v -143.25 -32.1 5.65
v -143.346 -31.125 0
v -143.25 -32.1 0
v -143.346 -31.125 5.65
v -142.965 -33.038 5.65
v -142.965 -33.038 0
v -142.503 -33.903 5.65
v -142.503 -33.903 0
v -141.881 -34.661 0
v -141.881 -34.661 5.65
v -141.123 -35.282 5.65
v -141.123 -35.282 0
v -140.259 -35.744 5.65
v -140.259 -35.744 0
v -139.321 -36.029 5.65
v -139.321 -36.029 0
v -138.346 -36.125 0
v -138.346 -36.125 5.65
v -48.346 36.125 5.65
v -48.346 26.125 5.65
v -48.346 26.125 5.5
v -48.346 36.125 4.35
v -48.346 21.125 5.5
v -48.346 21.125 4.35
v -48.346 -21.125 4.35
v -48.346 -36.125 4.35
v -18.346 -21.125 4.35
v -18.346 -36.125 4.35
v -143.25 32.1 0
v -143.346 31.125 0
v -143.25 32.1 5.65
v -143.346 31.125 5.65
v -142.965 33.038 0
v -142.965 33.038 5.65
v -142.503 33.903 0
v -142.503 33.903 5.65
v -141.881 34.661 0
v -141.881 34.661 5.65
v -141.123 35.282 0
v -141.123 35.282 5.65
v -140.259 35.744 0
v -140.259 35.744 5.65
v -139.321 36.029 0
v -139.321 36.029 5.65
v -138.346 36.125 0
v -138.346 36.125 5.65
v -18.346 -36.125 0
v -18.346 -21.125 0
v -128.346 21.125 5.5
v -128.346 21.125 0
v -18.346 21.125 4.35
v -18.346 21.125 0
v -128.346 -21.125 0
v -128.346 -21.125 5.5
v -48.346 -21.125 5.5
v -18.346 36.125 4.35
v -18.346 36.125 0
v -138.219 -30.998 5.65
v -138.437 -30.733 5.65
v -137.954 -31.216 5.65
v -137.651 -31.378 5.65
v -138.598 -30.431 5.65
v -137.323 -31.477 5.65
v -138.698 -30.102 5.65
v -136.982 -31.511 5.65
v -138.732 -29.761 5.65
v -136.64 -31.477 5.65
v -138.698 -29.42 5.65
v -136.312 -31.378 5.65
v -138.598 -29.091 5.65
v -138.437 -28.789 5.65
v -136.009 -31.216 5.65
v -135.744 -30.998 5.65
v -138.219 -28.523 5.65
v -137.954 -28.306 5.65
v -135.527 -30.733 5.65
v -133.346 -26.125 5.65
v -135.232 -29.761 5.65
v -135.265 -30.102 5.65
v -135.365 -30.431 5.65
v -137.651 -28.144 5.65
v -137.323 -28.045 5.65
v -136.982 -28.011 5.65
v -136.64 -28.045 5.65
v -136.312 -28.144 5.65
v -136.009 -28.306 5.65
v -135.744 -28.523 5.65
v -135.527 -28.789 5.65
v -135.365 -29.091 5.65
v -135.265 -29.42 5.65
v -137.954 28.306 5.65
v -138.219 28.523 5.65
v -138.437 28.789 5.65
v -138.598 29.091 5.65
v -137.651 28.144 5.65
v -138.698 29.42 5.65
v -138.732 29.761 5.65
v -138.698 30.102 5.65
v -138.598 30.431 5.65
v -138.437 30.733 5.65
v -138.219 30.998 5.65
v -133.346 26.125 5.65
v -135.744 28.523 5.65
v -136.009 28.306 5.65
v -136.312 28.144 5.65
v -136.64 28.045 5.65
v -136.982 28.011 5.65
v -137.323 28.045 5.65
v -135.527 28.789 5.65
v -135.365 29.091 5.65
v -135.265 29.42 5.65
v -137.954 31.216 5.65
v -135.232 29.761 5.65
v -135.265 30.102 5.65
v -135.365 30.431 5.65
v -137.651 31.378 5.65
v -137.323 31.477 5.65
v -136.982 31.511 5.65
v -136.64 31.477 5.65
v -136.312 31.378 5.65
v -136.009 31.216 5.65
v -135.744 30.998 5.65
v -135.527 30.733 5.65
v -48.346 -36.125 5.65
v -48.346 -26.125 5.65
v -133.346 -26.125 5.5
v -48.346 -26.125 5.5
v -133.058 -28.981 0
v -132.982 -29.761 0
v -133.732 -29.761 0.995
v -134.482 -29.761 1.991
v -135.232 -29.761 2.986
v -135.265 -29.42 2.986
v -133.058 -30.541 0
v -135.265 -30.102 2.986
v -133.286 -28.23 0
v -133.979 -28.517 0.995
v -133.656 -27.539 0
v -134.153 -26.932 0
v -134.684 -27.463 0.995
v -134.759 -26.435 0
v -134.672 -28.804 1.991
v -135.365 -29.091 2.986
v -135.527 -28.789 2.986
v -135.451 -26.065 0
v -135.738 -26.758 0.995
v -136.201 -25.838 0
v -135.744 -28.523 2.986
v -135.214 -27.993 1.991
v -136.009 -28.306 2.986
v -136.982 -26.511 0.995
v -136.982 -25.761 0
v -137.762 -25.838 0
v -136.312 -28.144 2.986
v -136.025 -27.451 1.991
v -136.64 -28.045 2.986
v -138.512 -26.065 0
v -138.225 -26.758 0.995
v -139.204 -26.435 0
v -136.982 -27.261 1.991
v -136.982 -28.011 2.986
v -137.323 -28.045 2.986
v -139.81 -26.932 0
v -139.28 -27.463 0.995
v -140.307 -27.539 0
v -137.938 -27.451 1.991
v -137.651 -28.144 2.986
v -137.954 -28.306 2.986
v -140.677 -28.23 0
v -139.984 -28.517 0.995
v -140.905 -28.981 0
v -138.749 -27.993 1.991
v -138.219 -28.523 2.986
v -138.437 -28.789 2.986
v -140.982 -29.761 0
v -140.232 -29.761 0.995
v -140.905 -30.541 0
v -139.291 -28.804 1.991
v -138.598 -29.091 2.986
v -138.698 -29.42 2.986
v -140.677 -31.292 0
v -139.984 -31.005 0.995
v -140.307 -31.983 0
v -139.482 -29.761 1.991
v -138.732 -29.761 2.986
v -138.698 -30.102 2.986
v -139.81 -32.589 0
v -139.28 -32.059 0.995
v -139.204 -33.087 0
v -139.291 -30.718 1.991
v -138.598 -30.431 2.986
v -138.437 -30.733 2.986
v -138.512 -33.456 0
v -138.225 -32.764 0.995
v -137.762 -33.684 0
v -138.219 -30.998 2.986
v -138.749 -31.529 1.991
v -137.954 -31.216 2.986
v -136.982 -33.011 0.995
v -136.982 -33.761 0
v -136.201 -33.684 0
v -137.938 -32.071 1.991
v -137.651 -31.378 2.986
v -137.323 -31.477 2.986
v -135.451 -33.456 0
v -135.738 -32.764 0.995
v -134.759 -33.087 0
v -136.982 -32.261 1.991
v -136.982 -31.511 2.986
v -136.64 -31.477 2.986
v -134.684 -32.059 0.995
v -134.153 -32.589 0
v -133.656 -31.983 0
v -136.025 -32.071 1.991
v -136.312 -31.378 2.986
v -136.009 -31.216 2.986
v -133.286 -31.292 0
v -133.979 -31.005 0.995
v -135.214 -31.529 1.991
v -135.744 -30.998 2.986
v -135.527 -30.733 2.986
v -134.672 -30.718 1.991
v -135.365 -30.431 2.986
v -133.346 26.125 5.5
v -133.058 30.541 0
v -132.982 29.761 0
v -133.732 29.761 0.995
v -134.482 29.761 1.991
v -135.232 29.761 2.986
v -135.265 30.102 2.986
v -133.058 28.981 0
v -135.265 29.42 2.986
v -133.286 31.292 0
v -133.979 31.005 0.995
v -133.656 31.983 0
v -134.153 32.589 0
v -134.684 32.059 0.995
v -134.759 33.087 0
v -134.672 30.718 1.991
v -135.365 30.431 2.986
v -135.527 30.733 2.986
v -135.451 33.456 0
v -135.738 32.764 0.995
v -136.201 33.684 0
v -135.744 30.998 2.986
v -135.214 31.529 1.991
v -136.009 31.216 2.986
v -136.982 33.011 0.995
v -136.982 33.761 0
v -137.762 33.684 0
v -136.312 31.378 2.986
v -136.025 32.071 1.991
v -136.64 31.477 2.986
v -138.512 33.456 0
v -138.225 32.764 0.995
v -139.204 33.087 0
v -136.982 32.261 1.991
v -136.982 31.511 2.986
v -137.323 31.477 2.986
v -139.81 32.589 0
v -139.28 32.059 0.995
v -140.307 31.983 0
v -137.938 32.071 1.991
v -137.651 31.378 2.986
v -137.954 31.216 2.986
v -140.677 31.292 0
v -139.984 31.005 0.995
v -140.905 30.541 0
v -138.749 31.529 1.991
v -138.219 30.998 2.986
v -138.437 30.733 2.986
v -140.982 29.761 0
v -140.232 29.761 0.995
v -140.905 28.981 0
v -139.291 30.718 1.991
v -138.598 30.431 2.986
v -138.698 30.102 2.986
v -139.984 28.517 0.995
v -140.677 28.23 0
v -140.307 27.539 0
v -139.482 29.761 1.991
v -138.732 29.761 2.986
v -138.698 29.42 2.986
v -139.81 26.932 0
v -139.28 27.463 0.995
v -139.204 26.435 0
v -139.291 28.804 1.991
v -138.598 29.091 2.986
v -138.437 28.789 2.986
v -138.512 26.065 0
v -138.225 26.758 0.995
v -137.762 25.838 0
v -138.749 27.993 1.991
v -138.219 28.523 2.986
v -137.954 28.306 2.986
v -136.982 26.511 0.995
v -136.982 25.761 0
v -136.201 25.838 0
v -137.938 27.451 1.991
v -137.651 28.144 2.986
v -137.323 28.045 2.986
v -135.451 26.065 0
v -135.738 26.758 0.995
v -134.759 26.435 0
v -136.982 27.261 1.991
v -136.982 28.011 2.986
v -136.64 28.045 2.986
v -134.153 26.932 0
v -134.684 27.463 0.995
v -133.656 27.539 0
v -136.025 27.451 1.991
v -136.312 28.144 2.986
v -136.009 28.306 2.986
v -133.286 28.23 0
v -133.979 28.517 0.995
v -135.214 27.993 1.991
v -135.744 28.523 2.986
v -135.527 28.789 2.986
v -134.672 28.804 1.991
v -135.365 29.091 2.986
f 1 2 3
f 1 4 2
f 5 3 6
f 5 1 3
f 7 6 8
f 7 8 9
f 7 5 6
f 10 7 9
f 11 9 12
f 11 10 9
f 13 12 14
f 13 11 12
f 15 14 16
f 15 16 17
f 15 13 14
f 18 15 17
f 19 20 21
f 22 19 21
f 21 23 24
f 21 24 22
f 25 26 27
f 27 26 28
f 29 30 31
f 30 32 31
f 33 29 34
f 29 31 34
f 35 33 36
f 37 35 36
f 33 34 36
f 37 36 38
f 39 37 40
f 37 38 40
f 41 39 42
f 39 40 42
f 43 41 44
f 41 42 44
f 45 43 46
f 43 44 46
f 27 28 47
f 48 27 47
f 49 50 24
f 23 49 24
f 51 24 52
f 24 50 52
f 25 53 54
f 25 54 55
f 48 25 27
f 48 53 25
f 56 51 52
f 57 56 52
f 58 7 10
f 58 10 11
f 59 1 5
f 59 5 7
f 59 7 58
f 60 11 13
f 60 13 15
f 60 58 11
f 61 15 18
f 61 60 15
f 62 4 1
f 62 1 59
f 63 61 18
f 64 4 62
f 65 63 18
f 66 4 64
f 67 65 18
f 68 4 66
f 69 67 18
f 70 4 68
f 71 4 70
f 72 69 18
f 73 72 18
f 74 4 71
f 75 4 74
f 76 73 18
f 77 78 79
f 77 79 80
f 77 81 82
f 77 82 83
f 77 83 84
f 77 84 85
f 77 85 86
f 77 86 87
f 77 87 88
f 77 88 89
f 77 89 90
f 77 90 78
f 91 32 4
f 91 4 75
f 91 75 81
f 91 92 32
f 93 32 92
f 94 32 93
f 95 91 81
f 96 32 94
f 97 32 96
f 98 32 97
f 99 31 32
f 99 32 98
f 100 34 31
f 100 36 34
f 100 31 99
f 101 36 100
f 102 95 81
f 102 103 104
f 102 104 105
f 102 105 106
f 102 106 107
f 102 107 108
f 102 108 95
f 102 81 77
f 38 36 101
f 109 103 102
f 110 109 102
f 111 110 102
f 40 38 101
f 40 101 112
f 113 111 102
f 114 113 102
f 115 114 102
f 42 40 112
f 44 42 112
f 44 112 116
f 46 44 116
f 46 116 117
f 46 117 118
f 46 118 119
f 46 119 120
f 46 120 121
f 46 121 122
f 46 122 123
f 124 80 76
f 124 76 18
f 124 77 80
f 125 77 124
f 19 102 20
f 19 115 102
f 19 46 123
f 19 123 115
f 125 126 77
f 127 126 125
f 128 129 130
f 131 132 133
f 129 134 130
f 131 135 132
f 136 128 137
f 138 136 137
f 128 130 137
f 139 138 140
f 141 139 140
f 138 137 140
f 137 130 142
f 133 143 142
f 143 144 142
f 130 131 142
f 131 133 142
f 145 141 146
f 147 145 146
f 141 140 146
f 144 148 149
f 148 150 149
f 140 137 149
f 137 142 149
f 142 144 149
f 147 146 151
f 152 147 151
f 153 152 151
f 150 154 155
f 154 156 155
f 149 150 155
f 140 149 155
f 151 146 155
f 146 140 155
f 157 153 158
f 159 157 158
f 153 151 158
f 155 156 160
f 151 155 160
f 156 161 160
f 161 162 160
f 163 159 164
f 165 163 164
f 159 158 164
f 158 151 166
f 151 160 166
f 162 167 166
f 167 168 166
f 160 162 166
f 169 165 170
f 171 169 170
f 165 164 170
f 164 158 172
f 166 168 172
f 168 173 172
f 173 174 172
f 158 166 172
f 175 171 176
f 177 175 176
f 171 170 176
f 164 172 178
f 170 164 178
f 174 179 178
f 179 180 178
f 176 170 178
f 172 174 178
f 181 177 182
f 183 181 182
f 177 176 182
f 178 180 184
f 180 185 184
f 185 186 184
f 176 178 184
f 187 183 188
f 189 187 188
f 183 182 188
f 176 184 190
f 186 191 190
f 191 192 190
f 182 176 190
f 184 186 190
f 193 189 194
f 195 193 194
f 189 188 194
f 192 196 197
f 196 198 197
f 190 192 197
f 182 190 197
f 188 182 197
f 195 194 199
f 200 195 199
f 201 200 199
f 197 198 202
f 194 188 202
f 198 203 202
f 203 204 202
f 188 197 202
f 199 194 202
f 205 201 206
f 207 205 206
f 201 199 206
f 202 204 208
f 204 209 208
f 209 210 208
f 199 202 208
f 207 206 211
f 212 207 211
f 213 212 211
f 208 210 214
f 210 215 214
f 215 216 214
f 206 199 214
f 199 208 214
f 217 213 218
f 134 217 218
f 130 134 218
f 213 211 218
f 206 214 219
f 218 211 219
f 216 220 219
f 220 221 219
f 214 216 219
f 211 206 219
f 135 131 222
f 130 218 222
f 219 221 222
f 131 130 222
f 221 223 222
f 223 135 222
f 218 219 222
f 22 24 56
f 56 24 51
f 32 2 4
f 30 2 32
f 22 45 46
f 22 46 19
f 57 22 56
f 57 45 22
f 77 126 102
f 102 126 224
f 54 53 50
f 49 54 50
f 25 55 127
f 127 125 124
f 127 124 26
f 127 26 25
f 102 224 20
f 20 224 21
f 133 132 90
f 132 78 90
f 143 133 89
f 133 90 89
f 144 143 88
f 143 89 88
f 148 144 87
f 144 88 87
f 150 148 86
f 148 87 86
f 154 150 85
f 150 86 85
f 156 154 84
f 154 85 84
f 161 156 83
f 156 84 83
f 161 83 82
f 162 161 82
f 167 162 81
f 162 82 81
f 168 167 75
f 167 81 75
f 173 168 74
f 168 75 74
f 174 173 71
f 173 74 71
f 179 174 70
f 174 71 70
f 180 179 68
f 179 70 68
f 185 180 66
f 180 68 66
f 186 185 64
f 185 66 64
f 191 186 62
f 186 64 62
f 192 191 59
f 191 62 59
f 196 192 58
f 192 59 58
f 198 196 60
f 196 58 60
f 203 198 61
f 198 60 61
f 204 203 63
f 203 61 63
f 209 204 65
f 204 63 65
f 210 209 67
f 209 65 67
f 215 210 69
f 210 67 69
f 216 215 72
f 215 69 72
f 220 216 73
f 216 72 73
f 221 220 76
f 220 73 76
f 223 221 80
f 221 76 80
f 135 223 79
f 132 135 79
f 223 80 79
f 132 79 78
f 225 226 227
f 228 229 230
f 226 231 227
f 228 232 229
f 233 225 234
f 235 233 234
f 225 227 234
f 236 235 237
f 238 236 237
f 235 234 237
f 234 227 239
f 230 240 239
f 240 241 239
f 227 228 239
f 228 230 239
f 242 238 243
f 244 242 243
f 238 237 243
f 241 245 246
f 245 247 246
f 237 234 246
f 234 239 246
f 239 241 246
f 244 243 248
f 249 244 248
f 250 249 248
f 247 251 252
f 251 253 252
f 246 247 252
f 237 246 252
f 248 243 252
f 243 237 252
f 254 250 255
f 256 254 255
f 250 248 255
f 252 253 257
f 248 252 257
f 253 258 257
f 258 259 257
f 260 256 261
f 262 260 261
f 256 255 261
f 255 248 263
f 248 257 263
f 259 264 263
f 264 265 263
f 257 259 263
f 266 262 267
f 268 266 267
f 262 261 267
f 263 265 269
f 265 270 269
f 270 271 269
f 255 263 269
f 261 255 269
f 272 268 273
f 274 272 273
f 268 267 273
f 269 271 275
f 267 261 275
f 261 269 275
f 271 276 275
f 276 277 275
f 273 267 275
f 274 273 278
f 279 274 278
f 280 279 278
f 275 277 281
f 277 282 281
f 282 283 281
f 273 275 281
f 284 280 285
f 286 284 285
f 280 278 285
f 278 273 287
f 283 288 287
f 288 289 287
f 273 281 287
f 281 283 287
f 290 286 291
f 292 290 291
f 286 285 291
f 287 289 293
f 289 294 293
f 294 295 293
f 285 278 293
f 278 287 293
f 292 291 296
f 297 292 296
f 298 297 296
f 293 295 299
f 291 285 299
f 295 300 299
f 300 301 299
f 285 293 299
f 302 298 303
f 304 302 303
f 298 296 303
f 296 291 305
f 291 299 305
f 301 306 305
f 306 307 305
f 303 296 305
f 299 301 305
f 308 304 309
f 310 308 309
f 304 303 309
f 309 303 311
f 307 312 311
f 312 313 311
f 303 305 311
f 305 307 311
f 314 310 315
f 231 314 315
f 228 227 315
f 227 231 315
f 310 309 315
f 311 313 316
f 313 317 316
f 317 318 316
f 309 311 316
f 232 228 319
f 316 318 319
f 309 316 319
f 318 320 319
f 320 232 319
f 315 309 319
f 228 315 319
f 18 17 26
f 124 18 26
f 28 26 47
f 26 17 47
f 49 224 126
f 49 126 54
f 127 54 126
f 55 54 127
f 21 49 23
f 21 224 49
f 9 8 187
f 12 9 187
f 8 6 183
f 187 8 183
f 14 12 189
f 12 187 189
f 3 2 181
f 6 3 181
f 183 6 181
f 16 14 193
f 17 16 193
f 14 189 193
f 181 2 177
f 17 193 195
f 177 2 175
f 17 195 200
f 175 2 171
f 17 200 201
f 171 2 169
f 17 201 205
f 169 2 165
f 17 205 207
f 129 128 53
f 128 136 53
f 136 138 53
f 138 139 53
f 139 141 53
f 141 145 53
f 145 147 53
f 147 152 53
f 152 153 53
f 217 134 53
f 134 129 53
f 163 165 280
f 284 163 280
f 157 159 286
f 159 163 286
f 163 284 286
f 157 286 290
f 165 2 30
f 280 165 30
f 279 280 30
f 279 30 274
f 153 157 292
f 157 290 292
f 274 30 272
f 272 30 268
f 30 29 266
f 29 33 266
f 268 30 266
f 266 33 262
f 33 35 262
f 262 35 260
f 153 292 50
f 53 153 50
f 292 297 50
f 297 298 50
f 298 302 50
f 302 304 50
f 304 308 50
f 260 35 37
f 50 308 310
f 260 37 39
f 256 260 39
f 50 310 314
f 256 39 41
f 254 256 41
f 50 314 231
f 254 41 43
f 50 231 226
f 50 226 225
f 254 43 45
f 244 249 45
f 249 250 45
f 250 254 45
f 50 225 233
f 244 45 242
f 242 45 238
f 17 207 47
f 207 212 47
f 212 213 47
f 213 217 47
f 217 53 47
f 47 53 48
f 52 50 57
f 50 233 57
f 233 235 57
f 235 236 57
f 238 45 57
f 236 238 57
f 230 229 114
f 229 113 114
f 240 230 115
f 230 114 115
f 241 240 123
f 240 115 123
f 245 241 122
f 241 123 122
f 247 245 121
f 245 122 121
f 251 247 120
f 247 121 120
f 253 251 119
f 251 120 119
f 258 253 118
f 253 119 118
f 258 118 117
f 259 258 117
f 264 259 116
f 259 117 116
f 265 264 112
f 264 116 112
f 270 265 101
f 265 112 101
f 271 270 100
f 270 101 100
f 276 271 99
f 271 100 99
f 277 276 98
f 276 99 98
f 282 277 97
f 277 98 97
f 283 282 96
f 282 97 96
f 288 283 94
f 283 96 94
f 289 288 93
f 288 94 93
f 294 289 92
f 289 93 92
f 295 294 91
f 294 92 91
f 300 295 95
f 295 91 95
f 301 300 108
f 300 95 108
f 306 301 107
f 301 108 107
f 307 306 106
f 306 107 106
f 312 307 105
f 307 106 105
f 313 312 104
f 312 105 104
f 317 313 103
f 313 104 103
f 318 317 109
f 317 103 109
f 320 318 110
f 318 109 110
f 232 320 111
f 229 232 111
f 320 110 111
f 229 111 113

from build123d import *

# Parameters (mm, degrees)
F0_W         = 210
F0_H         = 52.25
F0_W_2       = 200
F0_H_2       = 42.25
F1_DEPTH     = 5.5
F0_W_3       = 230
F0_H_3       = 72.25
F2_DEPTH     = 5.65
F4_DEPTH     = 100
F5_R         = 5
F6_R         = 1.75
F7_DEPTH     = 25
F6_R_2       = 4
F8_DEPTH     = 3
F9_S6_R      = 1.75
F9_T7_DEPTH  = 7
F9_S13_R     = 1.75
F9_T14_DEPTH = 7


# Not quite as in the source:
# - a fillet or chamfer that OpenCascade refuses, or shapes differently, is made with other operations: its cross-section is extruded or revolved along the edge and cut away or added


with BuildPart() as f1:
    # F0 (on Top) → F1 (new body)
    with BuildSketch(Plane.XY):
        with Locations((-28.3456140757, 0)):
            Rectangle(F0_W, F0_H)
        with Locations((-28.3456140757, 0)):
            Rectangle(F0_W_2, F0_H_2, mode=Mode.SUBTRACT)
    extrude(amount=F1_DEPTH)

    # F0 (on Top) → F2 (join)
    with BuildSketch(Plane.XY):
        with Locations((-28.3456140757, 0)):
            Rectangle(F0_W_3, F0_H_3)
        with Locations((-28.3456140757, 0)):
            Rectangle(F0_W, F0_H, mode=Mode.SUBTRACT)
    extrude(amount=F2_DEPTH)

    # F3 (on face) → F4 (cut)
    with BuildSketch(Plane.XZ.offset(36.125)):
        Polygon((-48.3456140757, 5.65), (-48.3456140757, 4.35), (-18.3456140757, 4.35), (-18.3456140757, 0), (86.6543859243, 0), (86.6543859243, 5.65), align=None)
    extrude(amount=-F4_DEPTH, mode=Mode.SUBTRACT)

    # F5
    f5_edges = [f1.edges().sort_by_distance(p)[0] for p in [
        (-143.345614, 36.125, 2.825),
        (-143.345614, -36.125, 2.825),
    ]]
    fillet(f5_edges, radius=F5_R)

    # F6 (on face) → F7 (cut)
    with BuildSketch(Plane.XY):
        with Locations((-136.9816213846, 29.760915786)):
            Circle(F6_R)
        with Locations((-136.9816213846, -29.760915786)):
            Circle(F6_R)
    extrude(amount=F7_DEPTH, mode=Mode.SUBTRACT)

    # F6 (on face) → F8 (cut)
    with BuildSketch(Plane.XY):
        with Locations((-136.9816213846, -29.760915786)):
            Circle(F6_R_2)
        with Locations((-136.9816213846, -29.760915786)):
            Circle(F6_R, mode=Mode.SUBTRACT)
        with Locations((-136.9816213846, 29.760915786)):
            Circle(F6_R_2)
        with Locations((-136.9816213846, 29.760915786)):
            Circle(F6_R, mode=Mode.SUBTRACT)
    extrude(amount=F8_DEPTH, mode=Mode.SUBTRACT)

    # F9: chamfer of 3 x 2.2606621503 on 2 edges, made by hand


with BuildPart() as f9_tool2:
    # F9_s3 → F9_t4 (revolve)
    with BuildSketch(Plane.XZ.offset(-29.760915786)):
        Polygon((-132.9816213846, 0), (-135.2422835349, 3), (-132.9816213846, 3), align=None)
    revolve(axis=Axis((-136.9816213846, 29.760915786, 3), (0, 0, 1)))

    split(bisect_by=Plane.XY, keep=Keep.TOP)

    # F9_s6 → F9_t7 (cut, symmetric)
    with BuildSketch(Plane.XY.offset(1.5)):
        with Locations((-136.9816213846, 29.760915786)):
            Circle(F9_S6_R)
    extrude(amount=F9_T7_DEPTH, both=True, mode=Mode.SUBTRACT)


with BuildPart() as f1_1:
    add(f1.part)

    # F9_t1: union F9_tool2
    add(f9_tool2.part)


with BuildPart() as f9_tool9:
    # F9_s10 → F9_t11 (revolve)
    with BuildSketch(Plane.XZ.offset(29.760915786)):
        Polygon((-132.9816213846, 0), (-135.2422835349, 3), (-132.9816213846, 3), align=None)
    revolve(axis=Axis((-136.9816213846, -29.760915786, 3), (0, 0, 1)))

    split(bisect_by=Plane.XY, keep=Keep.TOP)

    # F9_s13 → F9_t14 (cut, symmetric)
    with BuildSketch(Plane.XY.offset(1.5)):
        with Locations((-136.9816213846, -29.760915786)):
            Circle(F9_S13_R)
    extrude(amount=F9_T14_DEPTH, both=True, mode=Mode.SUBTRACT)


with BuildPart() as f1_2:
    add(f1_1.part)

    # F9_t8: union F9_tool9
    add(f9_tool9.part)


solid = f1_2.part
